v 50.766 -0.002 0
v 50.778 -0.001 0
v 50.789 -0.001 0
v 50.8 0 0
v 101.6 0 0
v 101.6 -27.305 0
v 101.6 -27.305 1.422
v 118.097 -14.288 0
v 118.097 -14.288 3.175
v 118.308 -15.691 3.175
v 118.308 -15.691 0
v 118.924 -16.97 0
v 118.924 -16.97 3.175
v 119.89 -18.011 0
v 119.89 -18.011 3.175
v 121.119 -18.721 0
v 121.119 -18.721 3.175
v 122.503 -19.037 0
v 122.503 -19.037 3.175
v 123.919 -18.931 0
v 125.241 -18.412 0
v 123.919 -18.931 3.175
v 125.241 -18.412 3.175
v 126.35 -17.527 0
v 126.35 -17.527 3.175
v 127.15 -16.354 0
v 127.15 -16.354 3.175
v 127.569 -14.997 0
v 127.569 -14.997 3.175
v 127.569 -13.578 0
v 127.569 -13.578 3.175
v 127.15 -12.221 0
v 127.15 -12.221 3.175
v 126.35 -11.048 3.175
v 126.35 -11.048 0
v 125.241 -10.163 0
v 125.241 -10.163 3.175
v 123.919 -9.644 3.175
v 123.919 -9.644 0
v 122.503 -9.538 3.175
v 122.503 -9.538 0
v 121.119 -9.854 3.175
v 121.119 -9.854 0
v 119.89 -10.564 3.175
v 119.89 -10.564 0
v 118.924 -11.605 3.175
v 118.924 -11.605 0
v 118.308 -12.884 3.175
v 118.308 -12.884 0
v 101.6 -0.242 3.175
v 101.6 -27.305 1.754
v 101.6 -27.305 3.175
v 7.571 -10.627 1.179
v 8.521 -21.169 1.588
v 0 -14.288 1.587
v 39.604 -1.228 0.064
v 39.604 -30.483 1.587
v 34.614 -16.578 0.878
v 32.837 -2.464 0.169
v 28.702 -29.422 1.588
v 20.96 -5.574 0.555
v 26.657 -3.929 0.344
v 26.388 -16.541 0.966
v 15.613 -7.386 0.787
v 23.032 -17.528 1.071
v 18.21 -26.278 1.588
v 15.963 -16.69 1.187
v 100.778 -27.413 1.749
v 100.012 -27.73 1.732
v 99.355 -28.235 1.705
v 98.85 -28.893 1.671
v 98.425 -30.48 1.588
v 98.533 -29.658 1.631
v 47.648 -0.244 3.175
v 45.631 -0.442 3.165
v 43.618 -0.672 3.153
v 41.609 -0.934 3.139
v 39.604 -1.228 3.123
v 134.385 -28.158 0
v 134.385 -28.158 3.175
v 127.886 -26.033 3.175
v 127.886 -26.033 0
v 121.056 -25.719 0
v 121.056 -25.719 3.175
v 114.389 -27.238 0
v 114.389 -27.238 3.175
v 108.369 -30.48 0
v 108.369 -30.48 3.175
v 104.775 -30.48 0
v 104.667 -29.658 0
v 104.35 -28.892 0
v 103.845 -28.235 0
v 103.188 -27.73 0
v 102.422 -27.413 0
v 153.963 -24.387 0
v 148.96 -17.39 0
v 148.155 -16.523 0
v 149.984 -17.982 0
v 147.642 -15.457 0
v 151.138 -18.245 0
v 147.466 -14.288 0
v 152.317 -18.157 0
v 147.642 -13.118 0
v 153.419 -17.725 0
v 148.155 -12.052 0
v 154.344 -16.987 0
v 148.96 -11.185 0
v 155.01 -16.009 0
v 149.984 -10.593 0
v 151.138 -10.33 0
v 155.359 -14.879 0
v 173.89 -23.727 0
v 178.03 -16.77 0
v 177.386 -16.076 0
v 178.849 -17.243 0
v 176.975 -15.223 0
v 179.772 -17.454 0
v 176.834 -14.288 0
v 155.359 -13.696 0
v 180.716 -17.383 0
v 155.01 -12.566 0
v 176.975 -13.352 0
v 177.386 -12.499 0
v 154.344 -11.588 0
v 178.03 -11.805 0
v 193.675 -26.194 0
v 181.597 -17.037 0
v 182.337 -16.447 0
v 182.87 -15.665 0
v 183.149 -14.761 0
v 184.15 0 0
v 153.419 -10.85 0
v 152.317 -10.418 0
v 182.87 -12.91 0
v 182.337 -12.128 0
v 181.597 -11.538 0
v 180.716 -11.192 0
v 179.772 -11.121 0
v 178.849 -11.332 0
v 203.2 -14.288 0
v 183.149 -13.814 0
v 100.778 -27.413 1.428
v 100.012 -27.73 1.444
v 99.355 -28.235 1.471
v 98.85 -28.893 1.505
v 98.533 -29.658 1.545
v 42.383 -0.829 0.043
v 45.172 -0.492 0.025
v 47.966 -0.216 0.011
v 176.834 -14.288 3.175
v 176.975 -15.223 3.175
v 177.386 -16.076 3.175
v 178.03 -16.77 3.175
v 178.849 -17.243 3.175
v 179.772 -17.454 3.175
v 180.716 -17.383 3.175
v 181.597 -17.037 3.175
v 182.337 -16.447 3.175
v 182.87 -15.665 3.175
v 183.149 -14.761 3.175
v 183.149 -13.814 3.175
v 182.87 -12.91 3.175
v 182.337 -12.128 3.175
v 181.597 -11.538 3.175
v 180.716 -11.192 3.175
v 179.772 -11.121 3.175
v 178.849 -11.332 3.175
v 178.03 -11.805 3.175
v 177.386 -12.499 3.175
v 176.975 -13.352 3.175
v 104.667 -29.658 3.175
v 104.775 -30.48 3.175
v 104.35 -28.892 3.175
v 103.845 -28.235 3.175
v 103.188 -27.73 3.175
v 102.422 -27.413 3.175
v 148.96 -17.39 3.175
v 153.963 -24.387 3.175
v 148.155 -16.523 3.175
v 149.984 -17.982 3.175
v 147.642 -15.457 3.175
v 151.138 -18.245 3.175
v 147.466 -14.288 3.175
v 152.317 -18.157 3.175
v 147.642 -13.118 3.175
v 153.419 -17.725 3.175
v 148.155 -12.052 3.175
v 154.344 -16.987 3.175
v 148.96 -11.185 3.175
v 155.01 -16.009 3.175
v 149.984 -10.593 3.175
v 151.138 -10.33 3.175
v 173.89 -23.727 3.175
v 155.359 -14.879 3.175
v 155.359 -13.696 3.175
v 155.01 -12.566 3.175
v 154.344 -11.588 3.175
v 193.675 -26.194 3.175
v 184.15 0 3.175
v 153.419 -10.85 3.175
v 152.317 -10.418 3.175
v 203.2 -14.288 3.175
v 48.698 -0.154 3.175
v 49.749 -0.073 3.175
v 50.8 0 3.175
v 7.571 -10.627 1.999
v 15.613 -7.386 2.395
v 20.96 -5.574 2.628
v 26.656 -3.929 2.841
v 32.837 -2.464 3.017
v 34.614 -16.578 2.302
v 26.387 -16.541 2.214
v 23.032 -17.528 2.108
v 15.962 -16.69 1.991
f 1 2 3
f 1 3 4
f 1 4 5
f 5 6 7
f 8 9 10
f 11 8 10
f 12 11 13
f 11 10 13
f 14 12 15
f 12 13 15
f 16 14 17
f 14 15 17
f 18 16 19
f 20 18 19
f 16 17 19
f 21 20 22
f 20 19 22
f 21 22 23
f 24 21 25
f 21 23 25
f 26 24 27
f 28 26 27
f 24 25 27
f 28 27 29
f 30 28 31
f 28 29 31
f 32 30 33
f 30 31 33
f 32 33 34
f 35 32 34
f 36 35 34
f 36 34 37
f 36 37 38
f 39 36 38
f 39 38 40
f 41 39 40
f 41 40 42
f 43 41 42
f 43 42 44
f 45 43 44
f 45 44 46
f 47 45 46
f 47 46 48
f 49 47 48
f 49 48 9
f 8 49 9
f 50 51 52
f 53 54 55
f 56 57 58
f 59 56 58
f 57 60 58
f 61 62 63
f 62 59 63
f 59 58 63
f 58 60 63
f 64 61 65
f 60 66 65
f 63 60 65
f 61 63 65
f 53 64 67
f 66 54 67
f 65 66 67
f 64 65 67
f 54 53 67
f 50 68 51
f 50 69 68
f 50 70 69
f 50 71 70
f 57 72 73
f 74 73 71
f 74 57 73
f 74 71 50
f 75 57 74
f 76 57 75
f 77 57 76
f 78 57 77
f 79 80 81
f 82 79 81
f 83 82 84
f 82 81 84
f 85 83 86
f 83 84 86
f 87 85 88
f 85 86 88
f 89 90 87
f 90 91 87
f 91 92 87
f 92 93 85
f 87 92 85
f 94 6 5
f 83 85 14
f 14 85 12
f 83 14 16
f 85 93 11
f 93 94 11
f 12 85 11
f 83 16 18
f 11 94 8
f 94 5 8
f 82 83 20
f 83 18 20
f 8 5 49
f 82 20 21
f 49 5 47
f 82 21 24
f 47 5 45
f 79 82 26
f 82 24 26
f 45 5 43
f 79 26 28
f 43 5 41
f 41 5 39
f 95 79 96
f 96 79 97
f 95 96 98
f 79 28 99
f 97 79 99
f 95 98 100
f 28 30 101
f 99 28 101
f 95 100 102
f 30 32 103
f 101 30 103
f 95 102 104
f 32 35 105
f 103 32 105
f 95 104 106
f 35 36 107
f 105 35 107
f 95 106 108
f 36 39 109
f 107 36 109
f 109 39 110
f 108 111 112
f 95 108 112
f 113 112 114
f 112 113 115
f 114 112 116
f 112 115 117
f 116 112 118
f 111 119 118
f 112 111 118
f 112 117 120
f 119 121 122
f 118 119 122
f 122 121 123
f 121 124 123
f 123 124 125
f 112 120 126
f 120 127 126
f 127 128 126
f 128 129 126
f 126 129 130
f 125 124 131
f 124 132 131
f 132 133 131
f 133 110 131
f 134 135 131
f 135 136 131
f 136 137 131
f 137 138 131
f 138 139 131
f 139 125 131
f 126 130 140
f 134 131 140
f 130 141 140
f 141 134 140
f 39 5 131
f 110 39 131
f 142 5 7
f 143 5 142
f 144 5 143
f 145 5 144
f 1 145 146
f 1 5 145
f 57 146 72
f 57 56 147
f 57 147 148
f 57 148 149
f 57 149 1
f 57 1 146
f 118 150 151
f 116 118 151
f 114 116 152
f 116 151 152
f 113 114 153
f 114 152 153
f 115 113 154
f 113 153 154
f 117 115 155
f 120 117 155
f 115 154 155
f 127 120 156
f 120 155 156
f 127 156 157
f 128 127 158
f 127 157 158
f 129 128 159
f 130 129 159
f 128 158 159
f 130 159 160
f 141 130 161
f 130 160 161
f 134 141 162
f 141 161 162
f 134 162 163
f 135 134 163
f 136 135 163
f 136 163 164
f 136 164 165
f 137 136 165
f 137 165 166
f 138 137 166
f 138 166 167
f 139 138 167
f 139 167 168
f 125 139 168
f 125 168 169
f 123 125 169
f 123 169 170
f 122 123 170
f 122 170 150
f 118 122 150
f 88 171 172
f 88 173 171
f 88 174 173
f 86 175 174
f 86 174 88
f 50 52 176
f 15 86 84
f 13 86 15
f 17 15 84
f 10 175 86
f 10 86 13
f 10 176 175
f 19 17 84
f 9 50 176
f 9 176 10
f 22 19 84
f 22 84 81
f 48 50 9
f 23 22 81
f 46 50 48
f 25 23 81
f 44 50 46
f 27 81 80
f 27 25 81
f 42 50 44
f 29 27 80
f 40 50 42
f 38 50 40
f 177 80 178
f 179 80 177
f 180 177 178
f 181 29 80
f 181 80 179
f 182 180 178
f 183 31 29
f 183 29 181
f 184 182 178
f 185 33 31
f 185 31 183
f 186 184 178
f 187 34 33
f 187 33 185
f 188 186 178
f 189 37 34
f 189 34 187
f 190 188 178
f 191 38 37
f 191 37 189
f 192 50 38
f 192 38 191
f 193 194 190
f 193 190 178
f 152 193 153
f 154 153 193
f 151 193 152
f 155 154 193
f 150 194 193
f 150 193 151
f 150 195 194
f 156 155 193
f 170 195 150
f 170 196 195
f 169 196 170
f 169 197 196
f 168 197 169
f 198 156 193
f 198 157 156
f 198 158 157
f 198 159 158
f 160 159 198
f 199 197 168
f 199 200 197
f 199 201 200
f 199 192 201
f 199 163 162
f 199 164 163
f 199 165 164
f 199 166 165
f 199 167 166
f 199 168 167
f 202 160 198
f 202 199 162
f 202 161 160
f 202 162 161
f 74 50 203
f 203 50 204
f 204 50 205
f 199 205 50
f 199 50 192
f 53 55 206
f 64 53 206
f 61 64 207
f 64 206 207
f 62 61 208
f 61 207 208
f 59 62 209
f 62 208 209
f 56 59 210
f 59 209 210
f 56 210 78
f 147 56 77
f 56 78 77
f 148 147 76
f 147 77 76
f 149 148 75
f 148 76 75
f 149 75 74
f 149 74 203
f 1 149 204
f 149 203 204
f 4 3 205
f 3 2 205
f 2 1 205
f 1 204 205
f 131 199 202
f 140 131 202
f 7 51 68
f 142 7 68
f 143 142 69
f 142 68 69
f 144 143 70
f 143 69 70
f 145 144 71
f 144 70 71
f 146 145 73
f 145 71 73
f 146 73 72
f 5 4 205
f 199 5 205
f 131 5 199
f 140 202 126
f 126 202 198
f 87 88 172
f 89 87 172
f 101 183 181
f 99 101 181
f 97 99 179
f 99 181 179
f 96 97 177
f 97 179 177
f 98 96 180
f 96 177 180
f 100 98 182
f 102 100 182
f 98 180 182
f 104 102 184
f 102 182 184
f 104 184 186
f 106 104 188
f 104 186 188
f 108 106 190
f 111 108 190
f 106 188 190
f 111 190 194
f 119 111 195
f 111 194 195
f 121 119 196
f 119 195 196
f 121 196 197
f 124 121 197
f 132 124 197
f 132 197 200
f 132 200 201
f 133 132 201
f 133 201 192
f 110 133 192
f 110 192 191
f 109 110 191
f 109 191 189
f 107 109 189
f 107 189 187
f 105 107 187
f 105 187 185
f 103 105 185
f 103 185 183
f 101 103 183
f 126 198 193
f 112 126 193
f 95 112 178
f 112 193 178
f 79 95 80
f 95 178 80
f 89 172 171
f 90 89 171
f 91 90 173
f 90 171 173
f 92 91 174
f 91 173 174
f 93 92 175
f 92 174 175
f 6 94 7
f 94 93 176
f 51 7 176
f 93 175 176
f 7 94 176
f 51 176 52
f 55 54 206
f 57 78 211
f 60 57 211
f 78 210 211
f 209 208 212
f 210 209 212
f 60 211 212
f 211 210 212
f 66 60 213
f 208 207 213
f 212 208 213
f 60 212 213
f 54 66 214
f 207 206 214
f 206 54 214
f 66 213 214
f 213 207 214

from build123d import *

# Parameters (mm, degrees)
F0_W     = 203.2
F0_H     = 38.1
F1_DEPTH = 3.175
F2_W     = 3.175
F2_H     = 4.445
F3_DEPTH = 25.4


# Not quite as in the source:
# - a feature names something its author has since deleted; it is built from what else it names


with BuildPart() as f1:
    # F0 (on Top) → F1 (new body)
    with BuildSketch(Plane.XY):
        with Locations((101.6, -19.05)):
            Rectangle(F0_W, F0_H)
    extrude(amount=F1_DEPTH)

    # F2 (on face) → F3 (cut)
    with BuildSketch(Plane.XY.offset(3.175)):
        with BuildLine():
            Line((0, -9.525), (0, -14.2875))
            ThreePointArc((0, -14.2875), (24.649723028, -4.4760985439), (50.8, 0))
            Line((50.8, 0), (0, 0))
            Line((0, 0), (0, -9.525))
        make_face()
        with Locations((103.1875, -35.8775)):
            Rectangle(F2_W, F2_H)
        with BuildLine():
            ThreePointArc((104.775, -30.48), (103.8450640303, -32.7250640303), (101.6, -33.655))
            Line((101.6, -33.655), (104.775, -33.655))
            Line((104.775, -33.655), (104.775, -30.48))
        make_face()
        with BuildLine():
            Line((104.775, -30.48), (101.6, -30.48))
            Line((101.6, -30.48), (101.6, -33.655))
            ThreePointArc((101.6, -33.655), (103.8450640303, -32.7250640303), (104.775, -30.48))
        make_face()
        with BuildLine():
            Line((101.6, -27.305), (101.6, -30.48))
            Line((101.6, -30.48), (104.775, -30.48))
            ThreePointArc((104.775, -30.48), (103.8450640303, -28.2349359697), (101.6, -27.305))
        make_face()
        with BuildLine():
            Line((98.4250000029, -30.4801362911), (101.6, -30.48))
            Line((101.6, -30.48), (101.6, -27.305))
            ThreePointArc((101.6, -27.305), (99.3548877841, -28.2349841564), (98.4250000029, -30.4801362911))
        make_face()
        with BuildLine():
            Line((101.6, -33.655), (101.6, -30.48))
            Line((101.6, -30.48), (98.4250000029, -30.4801362911))
            ThreePointArc((98.4250000029, -30.4801362911), (99.3549841564, -32.7251122159), (101.6, -33.655))
        make_face()
        with BuildLine():
            ThreePointArc((108.3690122037, -30.48), (106.4969075417, -31.9824905065), (104.775, -33.655))
            Line((104.775, -33.655), (104.775, -38.1))
            Line((104.775, -38.1), (184.15, -38.1))
            Line((184.15, -38.1), (193.675, -26.19375))
            ThreePointArc((193.675, -26.19375), (163.9135585822, -23.6655567526), (134.3847364187, -28.1581971794))
            ThreePointArc((134.3847364187, -28.1581971794), (121.0555708247, -25.7189035938), (108.3690122037, -30.48))
        make_face()
        with BuildLine():
            Line((101.6, -38.1), (101.6, -33.655))
            ThreePointArc((101.6, -33.655), (99.3549841564, -32.7251122159), (98.4250000029, -30.4801362911))
            Line((98.4250000029, -30.4801362911), (39.6036359929, -30.4826612755))
            ThreePointArc((39.6036359929, -30.4826612755), (18.2099329026, -26.2778753266), (0, -14.2875))
            Line((0, -14.2875), (0, -19.05))
            Line((0, -19.05), (0, -38.1))
            Line((0, -38.1), (101.6, -38.1))
        make_face()
        Polygon((203.2, 0), (184.15, 0), (203.2, -14.2875), align=None)
        Polygon((193.675, -26.19375), (184.15, -38.1), (203.2, -38.1), (203.2, -19.05), (203.2, -14.2875), align=None)
        with BuildLine():
            Line((108.3690122037, -30.48), (104.775, -30.48))
            Line((104.775, -30.48), (104.775, -33.655))
            ThreePointArc((104.775, -33.655), (106.4969075417, -31.9824905065), (108.3690122037, -30.48))
        make_face()
        with BuildLine():
            ThreePointArc((127.6218066335, -14.2875), (122.8593066335, -9.525), (118.0968066335, -14.2875))
            Line((118.0968066335, -14.2875), (127.6218066335, -14.2875))
        make_face()
        with BuildLine():
            Line((127.6218066335, -14.2875), (118.0968066335, -14.2875))
            ThreePointArc((118.0968066335, -14.2875), (122.8593066335, -19.05), (127.6218066335, -14.2875))
        make_face()
        with BuildLine():
            Line((176.8343066335, -14.2875), (183.1843066335, -14.2875))
            ThreePointArc((183.1843066335, -14.2875), (180.0093066335, -11.1125), (176.8343066335, -14.2875))
        make_face()
        with BuildLine():
            ThreePointArc((176.8343066335, -14.2875), (180.0093066335, -17.4625), (183.1843066335, -14.2875))
            Line((183.1843066335, -14.2875), (176.8343066335, -14.2875))
        make_face()
        with BuildLine():
            ThreePointArc((155.4030566335, -14.2875), (151.4343066335, -10.31875), (147.4655566335, -14.2875))
            Line((147.4655566335, -14.2875), (155.4030566335, -14.2875))
        make_face()
        with BuildLine():
            Line((155.4030566335, -14.2875), (147.4655566335, -14.2875))
            ThreePointArc((147.4655566335, -14.2875), (151.4343066335, -18.25625), (155.4030566335, -14.2875))
        make_face()
    extrude(amount=-F3_DEPTH, mode=Mode.SUBTRACT)

    # F8: sweep along a path in F5
    with BuildLine(Plane.XY.offset(1.5875)) as f8_path:
        Line((101.6, -30.48), (39.6036359929, -30.4826612755))
        ThreePointArc((39.6036359929, -30.4826612755), (18.2099329026, -26.2778753266), (0, -14.2875))
    # F7 (on offset) → F8 (sweep, cut)
    with BuildSketch(Plane.YZ.offset(101.6)):
        Polygon((-30.48, 3.1877), (-30.48, 1.5875), (-21.4048148322, 3.1877), align=None)
        Polygon((-21.4048148322, 3.1877), (-30.48, 1.5875), (0, 3.1877), align=None)
        Polygon((-21.4768401114, 0), (0, 0), (-30.48, 1.5875), align=None)
        Polygon((-4.1187478461, -3.0607), (-21.4768401114, 0), (-30.48, 0), (-30.48, -3.0607), align=None)
        Polygon((-30.48, 0), (-21.4768401114, 0), (-30.48, 1.5875), align=None)
        Polygon((-30.48, 6.2357), (-30.48, 3.1877), (-21.4048148322, 3.1877), (-4.1187478461, 6.2357), align=None)
    sweep(path=f8_path.line, mode=Mode.SUBTRACT)


solid = f1.part
